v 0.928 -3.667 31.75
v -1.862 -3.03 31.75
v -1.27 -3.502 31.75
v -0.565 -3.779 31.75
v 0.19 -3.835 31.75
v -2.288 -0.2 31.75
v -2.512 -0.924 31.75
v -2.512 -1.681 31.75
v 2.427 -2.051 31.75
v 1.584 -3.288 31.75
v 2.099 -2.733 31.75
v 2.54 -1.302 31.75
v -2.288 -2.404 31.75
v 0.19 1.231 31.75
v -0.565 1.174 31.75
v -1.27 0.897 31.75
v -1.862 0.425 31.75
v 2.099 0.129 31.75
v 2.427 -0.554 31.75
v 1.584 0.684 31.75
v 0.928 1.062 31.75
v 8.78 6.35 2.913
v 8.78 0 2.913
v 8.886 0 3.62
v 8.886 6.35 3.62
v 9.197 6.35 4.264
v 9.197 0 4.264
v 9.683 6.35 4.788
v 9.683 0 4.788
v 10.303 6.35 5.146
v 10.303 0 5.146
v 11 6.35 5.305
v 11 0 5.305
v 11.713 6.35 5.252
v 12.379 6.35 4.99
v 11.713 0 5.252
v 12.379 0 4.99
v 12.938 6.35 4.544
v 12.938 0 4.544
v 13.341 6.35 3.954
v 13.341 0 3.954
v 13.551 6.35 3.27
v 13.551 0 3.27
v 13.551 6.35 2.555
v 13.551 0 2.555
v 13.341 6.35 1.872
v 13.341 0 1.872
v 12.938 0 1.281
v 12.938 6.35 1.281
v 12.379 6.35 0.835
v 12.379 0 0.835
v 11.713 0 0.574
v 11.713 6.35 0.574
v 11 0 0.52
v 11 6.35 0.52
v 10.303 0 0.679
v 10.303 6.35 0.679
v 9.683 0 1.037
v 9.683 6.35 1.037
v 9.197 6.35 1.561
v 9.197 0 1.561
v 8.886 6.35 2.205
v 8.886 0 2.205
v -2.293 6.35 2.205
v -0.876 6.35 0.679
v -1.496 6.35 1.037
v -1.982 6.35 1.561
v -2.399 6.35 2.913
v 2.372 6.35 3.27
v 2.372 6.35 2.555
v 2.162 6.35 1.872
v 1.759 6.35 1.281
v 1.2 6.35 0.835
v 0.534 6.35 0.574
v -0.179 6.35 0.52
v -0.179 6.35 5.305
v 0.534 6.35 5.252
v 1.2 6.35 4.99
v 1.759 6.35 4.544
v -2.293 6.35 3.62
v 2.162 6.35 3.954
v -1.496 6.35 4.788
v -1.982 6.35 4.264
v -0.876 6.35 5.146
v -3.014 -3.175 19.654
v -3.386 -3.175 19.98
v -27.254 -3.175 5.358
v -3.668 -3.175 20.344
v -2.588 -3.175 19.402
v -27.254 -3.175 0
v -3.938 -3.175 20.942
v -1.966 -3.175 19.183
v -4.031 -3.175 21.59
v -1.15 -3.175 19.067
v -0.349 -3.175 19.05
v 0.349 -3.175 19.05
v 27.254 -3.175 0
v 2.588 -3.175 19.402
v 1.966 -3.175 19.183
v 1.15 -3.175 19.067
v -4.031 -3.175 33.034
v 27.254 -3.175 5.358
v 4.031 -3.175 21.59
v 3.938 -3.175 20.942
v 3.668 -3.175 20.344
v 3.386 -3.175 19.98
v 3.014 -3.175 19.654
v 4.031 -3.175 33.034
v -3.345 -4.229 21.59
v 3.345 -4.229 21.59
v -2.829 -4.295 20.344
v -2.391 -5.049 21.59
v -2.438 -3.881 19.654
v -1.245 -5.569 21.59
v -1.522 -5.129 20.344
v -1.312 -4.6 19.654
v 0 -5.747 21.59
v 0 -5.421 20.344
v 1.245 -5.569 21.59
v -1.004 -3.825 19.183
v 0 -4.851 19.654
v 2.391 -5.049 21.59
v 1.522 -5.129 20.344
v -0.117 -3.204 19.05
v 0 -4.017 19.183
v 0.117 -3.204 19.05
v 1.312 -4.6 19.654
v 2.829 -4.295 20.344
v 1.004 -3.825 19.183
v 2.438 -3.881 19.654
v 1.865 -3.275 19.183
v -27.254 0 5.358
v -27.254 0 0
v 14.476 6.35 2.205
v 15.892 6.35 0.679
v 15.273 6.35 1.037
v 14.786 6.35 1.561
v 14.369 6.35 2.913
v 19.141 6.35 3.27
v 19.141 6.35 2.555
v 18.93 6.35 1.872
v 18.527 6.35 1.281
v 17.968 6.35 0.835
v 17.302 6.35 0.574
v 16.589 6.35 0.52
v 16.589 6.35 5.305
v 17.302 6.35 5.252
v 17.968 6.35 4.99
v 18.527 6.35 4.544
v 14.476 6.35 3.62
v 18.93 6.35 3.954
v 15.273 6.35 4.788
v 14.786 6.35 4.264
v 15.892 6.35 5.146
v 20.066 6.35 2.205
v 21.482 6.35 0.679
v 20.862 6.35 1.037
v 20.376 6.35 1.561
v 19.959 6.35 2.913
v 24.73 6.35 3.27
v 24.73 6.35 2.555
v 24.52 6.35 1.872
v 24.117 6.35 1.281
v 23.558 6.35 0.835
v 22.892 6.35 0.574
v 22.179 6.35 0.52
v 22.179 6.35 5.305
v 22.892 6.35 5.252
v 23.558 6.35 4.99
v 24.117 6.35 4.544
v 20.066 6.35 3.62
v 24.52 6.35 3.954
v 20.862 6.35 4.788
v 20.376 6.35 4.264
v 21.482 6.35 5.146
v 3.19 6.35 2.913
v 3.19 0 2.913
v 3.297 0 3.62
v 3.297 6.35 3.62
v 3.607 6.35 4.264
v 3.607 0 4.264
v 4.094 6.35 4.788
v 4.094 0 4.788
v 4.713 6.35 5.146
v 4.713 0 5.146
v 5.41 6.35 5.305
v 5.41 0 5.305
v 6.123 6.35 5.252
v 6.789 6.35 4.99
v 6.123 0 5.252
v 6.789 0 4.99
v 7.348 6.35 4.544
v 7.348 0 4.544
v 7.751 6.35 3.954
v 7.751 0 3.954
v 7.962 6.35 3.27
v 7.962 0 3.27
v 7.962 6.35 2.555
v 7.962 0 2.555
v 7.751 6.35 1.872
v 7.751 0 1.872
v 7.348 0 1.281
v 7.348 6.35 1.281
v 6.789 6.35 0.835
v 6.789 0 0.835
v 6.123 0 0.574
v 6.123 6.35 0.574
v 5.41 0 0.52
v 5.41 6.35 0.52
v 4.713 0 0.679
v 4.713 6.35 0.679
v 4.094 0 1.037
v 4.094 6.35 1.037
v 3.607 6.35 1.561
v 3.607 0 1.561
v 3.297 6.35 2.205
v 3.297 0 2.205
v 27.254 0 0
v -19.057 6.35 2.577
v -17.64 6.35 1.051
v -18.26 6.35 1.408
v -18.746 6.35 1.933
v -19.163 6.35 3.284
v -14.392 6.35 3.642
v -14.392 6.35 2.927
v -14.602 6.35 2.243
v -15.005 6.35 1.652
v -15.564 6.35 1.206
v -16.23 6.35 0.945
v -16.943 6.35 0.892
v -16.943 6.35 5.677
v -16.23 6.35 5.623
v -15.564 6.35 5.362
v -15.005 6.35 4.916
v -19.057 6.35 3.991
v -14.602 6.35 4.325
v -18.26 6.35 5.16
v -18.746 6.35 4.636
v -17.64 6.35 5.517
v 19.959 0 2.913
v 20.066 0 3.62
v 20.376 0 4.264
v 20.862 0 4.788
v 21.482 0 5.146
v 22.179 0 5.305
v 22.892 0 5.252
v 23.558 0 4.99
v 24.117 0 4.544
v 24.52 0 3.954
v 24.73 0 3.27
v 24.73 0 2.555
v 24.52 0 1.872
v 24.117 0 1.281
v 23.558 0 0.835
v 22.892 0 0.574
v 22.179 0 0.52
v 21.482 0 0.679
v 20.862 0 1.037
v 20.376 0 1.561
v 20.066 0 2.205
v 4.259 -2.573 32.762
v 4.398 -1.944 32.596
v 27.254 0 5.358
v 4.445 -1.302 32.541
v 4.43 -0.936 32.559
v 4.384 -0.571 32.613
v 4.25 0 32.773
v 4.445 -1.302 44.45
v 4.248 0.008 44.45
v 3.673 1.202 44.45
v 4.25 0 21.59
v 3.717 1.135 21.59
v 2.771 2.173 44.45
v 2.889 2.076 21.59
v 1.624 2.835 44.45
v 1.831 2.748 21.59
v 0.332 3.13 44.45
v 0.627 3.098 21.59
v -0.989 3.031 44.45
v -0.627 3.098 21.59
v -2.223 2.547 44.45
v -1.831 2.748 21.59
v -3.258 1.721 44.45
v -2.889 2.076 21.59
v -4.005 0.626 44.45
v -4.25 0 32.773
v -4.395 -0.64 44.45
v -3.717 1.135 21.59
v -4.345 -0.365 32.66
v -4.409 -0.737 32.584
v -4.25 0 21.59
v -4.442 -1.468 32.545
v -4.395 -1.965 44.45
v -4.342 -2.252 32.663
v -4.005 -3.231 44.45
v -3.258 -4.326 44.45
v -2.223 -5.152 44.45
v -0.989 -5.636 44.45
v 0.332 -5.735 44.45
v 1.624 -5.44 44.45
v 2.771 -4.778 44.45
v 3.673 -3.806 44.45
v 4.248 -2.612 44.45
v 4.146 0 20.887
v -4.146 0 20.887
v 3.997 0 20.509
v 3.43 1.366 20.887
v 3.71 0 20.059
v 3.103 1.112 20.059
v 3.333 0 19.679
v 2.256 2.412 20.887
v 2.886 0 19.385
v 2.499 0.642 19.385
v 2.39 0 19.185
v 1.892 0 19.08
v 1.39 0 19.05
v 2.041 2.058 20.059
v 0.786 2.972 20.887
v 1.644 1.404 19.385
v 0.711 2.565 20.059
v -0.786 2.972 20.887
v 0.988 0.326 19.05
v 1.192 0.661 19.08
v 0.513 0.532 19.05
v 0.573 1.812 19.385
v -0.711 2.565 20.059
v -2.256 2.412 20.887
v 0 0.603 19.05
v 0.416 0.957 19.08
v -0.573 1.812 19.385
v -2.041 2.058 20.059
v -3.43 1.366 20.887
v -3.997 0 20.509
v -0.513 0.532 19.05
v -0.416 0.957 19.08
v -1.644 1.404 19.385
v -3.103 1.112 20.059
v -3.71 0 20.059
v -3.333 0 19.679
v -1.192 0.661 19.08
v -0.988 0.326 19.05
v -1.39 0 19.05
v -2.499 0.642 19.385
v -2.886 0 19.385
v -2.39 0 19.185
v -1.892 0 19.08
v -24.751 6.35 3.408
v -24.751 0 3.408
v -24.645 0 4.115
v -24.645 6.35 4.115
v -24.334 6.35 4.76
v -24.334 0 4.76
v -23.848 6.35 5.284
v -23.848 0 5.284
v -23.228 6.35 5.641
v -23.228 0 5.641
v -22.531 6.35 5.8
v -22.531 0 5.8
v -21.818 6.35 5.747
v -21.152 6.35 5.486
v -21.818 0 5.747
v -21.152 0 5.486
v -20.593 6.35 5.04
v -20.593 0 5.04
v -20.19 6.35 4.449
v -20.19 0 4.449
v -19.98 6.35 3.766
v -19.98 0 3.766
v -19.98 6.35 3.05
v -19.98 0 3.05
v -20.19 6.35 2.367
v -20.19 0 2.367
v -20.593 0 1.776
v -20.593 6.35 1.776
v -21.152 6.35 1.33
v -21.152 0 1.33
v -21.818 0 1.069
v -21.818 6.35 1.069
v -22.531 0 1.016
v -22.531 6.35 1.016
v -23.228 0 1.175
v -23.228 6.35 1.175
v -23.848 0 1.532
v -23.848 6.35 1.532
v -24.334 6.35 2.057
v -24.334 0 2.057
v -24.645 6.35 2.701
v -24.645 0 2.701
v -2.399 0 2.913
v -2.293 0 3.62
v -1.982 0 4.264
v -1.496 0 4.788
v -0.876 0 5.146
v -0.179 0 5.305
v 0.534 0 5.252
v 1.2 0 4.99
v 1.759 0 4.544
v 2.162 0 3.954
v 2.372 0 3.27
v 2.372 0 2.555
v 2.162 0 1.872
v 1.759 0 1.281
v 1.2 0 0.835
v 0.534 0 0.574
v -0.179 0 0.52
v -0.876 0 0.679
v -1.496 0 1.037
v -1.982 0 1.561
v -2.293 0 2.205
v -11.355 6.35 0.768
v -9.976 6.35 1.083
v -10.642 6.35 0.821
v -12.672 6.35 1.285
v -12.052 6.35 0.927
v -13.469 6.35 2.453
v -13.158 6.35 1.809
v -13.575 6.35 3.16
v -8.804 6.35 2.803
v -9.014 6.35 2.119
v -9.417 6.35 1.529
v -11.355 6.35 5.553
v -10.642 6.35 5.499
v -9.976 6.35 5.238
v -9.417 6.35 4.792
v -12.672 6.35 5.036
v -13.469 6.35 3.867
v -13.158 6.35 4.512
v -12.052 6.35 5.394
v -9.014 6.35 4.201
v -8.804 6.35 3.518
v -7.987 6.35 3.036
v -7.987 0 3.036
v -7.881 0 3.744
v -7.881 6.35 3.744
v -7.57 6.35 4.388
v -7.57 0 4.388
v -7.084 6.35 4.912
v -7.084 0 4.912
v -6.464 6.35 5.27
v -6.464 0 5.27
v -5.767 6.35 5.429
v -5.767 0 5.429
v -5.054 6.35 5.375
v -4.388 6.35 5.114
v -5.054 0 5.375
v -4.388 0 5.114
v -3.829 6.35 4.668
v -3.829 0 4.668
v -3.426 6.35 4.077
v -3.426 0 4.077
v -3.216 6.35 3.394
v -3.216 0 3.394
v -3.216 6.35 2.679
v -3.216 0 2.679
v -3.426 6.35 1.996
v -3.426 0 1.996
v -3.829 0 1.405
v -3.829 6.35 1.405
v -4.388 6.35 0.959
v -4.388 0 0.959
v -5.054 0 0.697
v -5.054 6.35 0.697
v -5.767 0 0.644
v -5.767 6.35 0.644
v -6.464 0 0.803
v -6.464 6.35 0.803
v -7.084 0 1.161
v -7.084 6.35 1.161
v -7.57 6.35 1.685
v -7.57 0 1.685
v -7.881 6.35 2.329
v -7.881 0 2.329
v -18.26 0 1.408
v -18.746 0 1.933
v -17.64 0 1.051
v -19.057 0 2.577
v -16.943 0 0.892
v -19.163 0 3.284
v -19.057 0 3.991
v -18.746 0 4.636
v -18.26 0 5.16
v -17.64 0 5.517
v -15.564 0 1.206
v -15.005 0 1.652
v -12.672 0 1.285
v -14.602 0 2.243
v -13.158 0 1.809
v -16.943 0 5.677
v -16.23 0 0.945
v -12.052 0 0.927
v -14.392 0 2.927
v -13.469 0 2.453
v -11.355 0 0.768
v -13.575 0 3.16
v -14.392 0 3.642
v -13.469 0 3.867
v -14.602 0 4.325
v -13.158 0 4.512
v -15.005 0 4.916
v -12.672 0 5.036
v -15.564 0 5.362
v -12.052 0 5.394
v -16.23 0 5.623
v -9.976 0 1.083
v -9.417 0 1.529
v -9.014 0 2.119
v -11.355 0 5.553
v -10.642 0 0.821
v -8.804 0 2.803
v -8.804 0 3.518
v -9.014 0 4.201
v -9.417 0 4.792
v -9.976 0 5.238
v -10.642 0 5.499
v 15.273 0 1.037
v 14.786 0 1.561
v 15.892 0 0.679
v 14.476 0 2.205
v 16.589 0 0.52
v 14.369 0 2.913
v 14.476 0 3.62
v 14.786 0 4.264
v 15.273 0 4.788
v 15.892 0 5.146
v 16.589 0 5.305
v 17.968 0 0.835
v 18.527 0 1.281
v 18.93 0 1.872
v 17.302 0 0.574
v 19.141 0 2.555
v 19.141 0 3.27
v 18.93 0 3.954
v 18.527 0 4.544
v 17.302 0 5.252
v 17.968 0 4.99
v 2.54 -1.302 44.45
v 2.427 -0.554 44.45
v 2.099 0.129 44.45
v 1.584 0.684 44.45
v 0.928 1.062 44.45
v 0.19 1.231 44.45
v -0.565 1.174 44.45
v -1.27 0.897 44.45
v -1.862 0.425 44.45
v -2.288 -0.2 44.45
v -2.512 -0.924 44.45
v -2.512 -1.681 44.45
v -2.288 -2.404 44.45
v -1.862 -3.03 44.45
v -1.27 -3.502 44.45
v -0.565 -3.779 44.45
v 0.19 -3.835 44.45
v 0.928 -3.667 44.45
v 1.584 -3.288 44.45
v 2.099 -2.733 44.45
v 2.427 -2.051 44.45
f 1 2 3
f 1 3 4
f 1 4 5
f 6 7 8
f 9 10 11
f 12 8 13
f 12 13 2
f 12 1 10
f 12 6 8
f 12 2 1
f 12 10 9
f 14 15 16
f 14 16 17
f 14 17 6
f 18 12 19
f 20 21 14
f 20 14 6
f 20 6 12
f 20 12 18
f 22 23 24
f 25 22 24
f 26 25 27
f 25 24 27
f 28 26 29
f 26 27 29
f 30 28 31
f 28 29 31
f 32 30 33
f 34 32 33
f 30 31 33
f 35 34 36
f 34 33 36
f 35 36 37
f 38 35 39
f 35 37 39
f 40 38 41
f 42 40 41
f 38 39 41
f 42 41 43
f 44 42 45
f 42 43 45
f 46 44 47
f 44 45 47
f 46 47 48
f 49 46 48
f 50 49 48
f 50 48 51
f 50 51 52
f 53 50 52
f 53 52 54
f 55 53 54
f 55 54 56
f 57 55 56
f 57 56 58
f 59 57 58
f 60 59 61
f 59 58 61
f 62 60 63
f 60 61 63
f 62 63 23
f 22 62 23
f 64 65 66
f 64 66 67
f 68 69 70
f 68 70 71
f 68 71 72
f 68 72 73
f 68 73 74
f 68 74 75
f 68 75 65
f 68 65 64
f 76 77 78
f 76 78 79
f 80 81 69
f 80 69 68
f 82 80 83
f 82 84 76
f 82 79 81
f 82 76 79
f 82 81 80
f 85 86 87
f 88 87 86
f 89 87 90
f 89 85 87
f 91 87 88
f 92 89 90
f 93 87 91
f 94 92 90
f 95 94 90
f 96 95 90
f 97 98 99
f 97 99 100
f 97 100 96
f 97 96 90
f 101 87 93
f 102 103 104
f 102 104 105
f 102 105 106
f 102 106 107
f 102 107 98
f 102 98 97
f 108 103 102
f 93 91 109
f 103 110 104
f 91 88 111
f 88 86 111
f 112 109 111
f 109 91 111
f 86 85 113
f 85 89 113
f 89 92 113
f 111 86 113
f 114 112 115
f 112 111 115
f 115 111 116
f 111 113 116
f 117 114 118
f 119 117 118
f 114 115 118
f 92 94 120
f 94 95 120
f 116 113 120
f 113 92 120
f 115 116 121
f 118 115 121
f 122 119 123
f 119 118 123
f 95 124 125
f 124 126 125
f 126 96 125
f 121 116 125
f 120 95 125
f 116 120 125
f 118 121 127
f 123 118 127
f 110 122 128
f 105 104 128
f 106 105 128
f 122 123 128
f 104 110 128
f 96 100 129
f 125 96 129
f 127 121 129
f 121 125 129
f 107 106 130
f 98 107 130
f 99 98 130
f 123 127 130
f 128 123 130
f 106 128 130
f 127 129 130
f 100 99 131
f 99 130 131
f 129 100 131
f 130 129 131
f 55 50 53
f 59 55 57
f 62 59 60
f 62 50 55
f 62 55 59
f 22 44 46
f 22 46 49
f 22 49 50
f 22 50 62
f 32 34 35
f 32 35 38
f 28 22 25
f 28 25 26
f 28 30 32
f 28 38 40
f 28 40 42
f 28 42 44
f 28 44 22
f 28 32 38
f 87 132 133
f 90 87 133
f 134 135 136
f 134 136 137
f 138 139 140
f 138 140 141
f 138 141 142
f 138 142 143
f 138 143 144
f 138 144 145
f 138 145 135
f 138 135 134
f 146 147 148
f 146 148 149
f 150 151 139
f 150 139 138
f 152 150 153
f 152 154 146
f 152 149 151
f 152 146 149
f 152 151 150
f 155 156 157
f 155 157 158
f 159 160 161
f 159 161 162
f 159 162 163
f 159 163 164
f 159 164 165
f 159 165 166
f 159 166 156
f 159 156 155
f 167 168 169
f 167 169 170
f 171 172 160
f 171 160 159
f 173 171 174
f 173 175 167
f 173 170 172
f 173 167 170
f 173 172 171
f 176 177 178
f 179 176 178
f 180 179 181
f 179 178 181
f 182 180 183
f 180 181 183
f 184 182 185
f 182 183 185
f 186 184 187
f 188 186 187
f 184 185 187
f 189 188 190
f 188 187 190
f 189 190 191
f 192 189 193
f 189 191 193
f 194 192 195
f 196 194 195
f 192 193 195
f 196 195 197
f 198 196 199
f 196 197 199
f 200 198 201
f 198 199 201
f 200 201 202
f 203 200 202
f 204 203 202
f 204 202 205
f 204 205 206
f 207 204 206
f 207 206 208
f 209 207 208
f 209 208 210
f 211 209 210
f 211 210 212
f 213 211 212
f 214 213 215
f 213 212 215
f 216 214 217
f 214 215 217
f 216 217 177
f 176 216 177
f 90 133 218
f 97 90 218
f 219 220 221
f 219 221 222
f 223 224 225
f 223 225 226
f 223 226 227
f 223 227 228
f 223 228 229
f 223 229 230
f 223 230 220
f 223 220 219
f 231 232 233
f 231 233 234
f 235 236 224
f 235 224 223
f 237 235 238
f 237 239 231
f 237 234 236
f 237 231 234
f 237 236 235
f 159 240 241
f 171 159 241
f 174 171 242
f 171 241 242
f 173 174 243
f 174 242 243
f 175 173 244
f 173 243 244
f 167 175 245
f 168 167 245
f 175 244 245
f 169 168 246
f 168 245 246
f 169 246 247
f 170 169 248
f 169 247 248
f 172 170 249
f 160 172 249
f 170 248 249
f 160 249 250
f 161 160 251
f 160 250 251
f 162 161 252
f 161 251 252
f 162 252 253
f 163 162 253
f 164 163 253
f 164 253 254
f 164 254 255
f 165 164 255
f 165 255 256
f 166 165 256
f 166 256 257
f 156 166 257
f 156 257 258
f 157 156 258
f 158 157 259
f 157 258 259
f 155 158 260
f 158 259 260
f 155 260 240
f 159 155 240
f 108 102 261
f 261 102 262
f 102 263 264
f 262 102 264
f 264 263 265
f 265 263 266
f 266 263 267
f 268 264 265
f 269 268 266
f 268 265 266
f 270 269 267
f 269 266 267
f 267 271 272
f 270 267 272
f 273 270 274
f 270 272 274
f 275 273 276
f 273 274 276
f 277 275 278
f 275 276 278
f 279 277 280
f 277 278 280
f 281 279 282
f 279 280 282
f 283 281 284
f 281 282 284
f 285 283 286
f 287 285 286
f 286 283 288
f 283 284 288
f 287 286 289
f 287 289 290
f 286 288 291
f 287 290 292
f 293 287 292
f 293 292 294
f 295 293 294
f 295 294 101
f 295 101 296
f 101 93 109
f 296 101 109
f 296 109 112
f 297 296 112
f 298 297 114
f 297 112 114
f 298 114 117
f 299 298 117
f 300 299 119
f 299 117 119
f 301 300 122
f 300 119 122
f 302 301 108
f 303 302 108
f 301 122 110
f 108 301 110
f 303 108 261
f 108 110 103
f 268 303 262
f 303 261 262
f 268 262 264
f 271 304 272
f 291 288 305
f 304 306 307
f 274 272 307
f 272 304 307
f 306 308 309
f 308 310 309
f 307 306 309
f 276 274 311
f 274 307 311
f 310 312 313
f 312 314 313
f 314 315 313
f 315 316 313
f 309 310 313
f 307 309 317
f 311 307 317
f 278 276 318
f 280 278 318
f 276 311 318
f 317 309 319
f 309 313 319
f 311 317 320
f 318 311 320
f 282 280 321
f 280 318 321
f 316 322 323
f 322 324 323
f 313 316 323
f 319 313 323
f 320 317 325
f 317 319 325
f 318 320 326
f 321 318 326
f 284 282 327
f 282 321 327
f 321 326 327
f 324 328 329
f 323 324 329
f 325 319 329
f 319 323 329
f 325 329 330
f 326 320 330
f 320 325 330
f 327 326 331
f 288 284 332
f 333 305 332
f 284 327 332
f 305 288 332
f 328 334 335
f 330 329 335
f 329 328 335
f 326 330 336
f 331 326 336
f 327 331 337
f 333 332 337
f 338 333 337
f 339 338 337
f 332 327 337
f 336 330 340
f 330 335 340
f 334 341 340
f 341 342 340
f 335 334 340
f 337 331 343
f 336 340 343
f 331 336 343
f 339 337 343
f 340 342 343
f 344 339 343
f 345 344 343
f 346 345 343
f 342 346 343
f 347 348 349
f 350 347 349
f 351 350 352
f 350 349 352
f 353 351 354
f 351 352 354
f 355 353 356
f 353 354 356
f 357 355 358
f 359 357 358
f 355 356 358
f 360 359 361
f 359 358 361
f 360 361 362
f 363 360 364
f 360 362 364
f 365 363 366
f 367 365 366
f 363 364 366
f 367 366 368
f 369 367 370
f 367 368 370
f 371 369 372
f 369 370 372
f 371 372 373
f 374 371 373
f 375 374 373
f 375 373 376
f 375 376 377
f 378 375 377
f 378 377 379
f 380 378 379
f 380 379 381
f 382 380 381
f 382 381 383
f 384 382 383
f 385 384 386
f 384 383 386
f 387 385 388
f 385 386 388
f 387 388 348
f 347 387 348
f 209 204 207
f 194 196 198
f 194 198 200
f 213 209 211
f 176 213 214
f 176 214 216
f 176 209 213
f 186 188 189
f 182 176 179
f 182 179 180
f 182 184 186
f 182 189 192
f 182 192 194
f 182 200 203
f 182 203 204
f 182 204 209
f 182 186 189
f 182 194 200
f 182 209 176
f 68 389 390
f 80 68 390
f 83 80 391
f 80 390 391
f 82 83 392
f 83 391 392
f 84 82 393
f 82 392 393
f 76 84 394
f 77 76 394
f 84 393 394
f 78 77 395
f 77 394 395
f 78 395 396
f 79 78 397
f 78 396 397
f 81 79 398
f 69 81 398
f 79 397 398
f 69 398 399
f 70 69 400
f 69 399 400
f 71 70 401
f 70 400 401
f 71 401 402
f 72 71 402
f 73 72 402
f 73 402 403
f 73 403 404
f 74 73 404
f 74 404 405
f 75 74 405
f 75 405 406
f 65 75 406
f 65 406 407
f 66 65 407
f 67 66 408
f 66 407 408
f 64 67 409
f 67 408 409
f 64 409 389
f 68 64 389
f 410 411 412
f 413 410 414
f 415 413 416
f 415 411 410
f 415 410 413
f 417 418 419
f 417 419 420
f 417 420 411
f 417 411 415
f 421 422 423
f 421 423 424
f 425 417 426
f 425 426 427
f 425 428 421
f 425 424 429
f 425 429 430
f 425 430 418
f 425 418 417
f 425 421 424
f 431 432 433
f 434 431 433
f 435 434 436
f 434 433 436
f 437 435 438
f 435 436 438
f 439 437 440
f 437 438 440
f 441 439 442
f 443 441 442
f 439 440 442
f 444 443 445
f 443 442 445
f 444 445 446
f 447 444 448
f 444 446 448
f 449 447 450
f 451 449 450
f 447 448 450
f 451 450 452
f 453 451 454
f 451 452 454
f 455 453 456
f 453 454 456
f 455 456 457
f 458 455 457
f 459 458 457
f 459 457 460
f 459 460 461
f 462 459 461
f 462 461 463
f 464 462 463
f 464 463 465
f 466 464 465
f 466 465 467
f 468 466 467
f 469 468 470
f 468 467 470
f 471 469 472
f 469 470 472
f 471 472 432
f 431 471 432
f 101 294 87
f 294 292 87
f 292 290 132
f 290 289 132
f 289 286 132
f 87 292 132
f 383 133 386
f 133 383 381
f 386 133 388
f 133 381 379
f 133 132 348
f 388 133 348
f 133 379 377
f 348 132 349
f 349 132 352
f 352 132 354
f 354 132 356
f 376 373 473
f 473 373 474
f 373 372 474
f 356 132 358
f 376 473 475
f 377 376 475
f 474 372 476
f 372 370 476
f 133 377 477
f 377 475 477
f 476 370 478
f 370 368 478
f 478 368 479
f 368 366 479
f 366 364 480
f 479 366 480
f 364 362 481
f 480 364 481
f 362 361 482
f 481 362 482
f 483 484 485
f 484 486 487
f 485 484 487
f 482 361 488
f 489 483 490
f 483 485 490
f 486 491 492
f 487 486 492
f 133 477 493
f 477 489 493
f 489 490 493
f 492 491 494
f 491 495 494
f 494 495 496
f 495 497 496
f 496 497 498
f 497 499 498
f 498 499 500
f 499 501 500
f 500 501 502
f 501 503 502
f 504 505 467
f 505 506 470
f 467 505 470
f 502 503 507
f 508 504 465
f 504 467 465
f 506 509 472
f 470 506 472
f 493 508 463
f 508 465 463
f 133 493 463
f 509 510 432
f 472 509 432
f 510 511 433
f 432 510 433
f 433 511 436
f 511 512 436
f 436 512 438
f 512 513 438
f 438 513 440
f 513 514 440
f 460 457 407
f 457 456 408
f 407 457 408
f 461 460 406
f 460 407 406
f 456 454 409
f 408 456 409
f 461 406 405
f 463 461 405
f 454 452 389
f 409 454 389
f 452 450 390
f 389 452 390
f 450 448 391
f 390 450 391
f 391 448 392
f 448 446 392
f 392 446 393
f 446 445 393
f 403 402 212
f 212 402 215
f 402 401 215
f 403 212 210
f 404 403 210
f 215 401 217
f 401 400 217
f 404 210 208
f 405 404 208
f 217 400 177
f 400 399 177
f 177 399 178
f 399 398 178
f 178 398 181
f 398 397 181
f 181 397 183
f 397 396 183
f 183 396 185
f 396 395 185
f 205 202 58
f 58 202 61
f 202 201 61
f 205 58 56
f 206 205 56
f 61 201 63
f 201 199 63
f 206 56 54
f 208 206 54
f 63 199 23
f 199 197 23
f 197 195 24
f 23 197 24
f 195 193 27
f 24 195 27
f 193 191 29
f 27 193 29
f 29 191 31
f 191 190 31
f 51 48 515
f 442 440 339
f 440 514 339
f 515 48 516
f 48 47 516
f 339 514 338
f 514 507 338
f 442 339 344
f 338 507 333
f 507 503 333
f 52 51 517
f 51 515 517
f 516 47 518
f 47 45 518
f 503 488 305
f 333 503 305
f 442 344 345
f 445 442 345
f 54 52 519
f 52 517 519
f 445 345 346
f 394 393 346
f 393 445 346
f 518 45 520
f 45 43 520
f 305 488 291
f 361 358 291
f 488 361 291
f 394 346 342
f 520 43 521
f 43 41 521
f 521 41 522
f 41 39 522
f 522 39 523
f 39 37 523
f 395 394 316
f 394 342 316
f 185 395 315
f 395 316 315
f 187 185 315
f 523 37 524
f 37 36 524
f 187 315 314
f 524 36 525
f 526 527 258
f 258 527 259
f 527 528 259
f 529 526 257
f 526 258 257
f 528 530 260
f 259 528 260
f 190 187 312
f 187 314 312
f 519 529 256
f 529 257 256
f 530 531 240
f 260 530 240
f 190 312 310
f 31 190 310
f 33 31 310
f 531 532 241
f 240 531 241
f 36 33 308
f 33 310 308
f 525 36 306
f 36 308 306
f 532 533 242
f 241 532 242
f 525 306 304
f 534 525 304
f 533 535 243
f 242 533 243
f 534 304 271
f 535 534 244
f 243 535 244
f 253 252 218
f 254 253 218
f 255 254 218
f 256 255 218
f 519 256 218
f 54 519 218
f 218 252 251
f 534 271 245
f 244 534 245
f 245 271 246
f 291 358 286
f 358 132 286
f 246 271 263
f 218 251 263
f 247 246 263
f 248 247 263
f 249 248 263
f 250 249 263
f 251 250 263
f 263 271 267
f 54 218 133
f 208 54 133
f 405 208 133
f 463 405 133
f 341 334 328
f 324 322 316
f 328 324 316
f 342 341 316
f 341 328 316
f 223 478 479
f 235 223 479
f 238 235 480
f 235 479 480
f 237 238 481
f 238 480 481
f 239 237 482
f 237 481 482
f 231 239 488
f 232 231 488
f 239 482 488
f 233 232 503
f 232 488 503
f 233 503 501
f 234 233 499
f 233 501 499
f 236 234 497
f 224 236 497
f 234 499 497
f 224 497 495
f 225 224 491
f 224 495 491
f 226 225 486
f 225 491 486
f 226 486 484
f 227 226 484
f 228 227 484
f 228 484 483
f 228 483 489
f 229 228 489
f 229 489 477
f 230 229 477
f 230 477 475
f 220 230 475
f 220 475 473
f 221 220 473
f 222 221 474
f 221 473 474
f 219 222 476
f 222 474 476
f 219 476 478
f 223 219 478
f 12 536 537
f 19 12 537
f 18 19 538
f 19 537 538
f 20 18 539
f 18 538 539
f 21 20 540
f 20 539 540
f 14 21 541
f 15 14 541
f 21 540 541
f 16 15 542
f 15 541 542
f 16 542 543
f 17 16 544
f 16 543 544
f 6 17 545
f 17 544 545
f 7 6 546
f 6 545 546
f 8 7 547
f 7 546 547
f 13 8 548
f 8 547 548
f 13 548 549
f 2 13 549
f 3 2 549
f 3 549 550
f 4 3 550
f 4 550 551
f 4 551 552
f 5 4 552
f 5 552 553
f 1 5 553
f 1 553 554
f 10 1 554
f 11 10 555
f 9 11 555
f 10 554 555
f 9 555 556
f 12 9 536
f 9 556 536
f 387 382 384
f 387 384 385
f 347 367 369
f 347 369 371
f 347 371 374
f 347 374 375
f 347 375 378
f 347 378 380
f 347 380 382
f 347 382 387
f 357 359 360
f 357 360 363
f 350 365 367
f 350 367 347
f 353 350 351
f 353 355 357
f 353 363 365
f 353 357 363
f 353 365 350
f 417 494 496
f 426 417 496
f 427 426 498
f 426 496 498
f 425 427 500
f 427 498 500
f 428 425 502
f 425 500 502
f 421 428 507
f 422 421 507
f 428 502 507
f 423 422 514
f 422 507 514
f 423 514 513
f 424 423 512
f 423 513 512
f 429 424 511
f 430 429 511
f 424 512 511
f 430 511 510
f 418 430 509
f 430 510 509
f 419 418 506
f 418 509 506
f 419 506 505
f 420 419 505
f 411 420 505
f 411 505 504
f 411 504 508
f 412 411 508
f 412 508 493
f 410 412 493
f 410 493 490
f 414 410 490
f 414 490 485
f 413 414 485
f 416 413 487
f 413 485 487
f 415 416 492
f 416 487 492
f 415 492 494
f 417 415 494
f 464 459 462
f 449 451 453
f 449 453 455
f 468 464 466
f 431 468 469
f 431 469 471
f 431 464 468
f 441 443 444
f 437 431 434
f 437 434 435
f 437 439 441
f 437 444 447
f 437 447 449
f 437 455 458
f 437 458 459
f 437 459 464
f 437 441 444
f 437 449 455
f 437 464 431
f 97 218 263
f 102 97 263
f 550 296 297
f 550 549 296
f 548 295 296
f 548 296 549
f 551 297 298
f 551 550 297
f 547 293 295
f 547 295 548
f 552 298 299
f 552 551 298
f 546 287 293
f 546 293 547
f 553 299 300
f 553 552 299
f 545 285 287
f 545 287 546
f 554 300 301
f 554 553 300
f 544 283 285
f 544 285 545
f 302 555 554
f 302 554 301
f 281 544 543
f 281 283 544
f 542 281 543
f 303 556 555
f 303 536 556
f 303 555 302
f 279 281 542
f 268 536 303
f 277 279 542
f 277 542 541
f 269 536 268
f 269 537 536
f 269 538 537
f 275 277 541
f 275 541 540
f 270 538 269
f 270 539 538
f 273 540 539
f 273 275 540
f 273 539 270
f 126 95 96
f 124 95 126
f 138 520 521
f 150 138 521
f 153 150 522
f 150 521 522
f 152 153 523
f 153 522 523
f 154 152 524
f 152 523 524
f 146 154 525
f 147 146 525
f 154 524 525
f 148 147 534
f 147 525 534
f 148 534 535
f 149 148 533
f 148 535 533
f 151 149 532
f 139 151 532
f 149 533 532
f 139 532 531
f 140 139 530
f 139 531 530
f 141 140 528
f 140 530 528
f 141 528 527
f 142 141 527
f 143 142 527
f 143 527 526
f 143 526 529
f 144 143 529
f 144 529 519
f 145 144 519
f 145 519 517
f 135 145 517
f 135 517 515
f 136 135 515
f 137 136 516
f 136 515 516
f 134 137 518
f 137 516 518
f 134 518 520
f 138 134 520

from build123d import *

# Parameters (mm, degrees)
F1_DEPTH  = 3.175
F2_R      = 2.3991188234
F3_DEPTH  = 6.35
F5_R      = 4.445
F6_DEPTH  = 25.4
F7_R      = 2.54
F8_R      = 2.54
F9_R      = 2.54
F10_DEPTH = 12.7


with BuildPart() as f1:
    # F0 (on Front) → F1 (new body)
    with BuildSketch(Plane.XZ):
        Polygon((27.2537042447, 5.3584766197), (0, 37.8381765649), (-27.2537042447, 5.3584766197), (-27.2537042447, 0), (27.2537042447, 0), align=None)
    extrude(amount=F1_DEPTH)

    # F2 (on face) → F3 (join)
    with BuildSketch(Plane(origin=(0, 0, 0), x_dir=(-1, 0, 0), z_dir=(0, 1, 0))):
        with Locations((16.764, 3.2841927184)):
            Circle(F2_R)
        with Locations((11.176, 3.1603162362)):
            Circle(F2_R)
        with Locations((5.588, 3.036439754)):
            Circle(F2_R)
        with Locations((22.352, 3.4080692006)):
            Circle(F2_R)
        with Locations((0, 2.9125632718)):
            Circle(F2_R)
        with Locations((-5.5895148385, 2.9125632718)):
            Circle(F2_R)
        with Locations((-11.179029677, 2.9125632718)):
            Circle(F2_R)
        with Locations((-22.358059354, 2.9125632718)):
            Circle(F2_R)
        with Locations((-16.7685445155, 2.9125632718)):
            Circle(F2_R)
    extrude(amount=F3_DEPTH)

    # F5 (on offset) → F6 (join)
    with BuildSketch(Plane.XY.offset(19.05)):
        with Locations((0, -1.302275006)):
            Circle(F5_R)
    extrude(amount=F6_DEPTH)

    # F7
    f7_edges = [f1.edges().sort_by_distance(p)[0] for p in [
        (0, 3.142725, 19.05),
    ]]
    fillet(f7_edges, radius=F7_R)

    # F8
    f8_edges = [f1.edges().sort_by_distance(p)[0] for p in [
        (0, -5.747275, 19.05),
    ]]
    fillet(f8_edges, radius=F8_R)

    # F9 (on face) → F10 (cut)
    with BuildSketch(Plane.XY.offset(44.45)):
        with Locations((0, -1.302275006)):
            Circle(F9_R)
    extrude(amount=-F10_DEPTH, mode=Mode.SUBTRACT)


solid = f1.part
